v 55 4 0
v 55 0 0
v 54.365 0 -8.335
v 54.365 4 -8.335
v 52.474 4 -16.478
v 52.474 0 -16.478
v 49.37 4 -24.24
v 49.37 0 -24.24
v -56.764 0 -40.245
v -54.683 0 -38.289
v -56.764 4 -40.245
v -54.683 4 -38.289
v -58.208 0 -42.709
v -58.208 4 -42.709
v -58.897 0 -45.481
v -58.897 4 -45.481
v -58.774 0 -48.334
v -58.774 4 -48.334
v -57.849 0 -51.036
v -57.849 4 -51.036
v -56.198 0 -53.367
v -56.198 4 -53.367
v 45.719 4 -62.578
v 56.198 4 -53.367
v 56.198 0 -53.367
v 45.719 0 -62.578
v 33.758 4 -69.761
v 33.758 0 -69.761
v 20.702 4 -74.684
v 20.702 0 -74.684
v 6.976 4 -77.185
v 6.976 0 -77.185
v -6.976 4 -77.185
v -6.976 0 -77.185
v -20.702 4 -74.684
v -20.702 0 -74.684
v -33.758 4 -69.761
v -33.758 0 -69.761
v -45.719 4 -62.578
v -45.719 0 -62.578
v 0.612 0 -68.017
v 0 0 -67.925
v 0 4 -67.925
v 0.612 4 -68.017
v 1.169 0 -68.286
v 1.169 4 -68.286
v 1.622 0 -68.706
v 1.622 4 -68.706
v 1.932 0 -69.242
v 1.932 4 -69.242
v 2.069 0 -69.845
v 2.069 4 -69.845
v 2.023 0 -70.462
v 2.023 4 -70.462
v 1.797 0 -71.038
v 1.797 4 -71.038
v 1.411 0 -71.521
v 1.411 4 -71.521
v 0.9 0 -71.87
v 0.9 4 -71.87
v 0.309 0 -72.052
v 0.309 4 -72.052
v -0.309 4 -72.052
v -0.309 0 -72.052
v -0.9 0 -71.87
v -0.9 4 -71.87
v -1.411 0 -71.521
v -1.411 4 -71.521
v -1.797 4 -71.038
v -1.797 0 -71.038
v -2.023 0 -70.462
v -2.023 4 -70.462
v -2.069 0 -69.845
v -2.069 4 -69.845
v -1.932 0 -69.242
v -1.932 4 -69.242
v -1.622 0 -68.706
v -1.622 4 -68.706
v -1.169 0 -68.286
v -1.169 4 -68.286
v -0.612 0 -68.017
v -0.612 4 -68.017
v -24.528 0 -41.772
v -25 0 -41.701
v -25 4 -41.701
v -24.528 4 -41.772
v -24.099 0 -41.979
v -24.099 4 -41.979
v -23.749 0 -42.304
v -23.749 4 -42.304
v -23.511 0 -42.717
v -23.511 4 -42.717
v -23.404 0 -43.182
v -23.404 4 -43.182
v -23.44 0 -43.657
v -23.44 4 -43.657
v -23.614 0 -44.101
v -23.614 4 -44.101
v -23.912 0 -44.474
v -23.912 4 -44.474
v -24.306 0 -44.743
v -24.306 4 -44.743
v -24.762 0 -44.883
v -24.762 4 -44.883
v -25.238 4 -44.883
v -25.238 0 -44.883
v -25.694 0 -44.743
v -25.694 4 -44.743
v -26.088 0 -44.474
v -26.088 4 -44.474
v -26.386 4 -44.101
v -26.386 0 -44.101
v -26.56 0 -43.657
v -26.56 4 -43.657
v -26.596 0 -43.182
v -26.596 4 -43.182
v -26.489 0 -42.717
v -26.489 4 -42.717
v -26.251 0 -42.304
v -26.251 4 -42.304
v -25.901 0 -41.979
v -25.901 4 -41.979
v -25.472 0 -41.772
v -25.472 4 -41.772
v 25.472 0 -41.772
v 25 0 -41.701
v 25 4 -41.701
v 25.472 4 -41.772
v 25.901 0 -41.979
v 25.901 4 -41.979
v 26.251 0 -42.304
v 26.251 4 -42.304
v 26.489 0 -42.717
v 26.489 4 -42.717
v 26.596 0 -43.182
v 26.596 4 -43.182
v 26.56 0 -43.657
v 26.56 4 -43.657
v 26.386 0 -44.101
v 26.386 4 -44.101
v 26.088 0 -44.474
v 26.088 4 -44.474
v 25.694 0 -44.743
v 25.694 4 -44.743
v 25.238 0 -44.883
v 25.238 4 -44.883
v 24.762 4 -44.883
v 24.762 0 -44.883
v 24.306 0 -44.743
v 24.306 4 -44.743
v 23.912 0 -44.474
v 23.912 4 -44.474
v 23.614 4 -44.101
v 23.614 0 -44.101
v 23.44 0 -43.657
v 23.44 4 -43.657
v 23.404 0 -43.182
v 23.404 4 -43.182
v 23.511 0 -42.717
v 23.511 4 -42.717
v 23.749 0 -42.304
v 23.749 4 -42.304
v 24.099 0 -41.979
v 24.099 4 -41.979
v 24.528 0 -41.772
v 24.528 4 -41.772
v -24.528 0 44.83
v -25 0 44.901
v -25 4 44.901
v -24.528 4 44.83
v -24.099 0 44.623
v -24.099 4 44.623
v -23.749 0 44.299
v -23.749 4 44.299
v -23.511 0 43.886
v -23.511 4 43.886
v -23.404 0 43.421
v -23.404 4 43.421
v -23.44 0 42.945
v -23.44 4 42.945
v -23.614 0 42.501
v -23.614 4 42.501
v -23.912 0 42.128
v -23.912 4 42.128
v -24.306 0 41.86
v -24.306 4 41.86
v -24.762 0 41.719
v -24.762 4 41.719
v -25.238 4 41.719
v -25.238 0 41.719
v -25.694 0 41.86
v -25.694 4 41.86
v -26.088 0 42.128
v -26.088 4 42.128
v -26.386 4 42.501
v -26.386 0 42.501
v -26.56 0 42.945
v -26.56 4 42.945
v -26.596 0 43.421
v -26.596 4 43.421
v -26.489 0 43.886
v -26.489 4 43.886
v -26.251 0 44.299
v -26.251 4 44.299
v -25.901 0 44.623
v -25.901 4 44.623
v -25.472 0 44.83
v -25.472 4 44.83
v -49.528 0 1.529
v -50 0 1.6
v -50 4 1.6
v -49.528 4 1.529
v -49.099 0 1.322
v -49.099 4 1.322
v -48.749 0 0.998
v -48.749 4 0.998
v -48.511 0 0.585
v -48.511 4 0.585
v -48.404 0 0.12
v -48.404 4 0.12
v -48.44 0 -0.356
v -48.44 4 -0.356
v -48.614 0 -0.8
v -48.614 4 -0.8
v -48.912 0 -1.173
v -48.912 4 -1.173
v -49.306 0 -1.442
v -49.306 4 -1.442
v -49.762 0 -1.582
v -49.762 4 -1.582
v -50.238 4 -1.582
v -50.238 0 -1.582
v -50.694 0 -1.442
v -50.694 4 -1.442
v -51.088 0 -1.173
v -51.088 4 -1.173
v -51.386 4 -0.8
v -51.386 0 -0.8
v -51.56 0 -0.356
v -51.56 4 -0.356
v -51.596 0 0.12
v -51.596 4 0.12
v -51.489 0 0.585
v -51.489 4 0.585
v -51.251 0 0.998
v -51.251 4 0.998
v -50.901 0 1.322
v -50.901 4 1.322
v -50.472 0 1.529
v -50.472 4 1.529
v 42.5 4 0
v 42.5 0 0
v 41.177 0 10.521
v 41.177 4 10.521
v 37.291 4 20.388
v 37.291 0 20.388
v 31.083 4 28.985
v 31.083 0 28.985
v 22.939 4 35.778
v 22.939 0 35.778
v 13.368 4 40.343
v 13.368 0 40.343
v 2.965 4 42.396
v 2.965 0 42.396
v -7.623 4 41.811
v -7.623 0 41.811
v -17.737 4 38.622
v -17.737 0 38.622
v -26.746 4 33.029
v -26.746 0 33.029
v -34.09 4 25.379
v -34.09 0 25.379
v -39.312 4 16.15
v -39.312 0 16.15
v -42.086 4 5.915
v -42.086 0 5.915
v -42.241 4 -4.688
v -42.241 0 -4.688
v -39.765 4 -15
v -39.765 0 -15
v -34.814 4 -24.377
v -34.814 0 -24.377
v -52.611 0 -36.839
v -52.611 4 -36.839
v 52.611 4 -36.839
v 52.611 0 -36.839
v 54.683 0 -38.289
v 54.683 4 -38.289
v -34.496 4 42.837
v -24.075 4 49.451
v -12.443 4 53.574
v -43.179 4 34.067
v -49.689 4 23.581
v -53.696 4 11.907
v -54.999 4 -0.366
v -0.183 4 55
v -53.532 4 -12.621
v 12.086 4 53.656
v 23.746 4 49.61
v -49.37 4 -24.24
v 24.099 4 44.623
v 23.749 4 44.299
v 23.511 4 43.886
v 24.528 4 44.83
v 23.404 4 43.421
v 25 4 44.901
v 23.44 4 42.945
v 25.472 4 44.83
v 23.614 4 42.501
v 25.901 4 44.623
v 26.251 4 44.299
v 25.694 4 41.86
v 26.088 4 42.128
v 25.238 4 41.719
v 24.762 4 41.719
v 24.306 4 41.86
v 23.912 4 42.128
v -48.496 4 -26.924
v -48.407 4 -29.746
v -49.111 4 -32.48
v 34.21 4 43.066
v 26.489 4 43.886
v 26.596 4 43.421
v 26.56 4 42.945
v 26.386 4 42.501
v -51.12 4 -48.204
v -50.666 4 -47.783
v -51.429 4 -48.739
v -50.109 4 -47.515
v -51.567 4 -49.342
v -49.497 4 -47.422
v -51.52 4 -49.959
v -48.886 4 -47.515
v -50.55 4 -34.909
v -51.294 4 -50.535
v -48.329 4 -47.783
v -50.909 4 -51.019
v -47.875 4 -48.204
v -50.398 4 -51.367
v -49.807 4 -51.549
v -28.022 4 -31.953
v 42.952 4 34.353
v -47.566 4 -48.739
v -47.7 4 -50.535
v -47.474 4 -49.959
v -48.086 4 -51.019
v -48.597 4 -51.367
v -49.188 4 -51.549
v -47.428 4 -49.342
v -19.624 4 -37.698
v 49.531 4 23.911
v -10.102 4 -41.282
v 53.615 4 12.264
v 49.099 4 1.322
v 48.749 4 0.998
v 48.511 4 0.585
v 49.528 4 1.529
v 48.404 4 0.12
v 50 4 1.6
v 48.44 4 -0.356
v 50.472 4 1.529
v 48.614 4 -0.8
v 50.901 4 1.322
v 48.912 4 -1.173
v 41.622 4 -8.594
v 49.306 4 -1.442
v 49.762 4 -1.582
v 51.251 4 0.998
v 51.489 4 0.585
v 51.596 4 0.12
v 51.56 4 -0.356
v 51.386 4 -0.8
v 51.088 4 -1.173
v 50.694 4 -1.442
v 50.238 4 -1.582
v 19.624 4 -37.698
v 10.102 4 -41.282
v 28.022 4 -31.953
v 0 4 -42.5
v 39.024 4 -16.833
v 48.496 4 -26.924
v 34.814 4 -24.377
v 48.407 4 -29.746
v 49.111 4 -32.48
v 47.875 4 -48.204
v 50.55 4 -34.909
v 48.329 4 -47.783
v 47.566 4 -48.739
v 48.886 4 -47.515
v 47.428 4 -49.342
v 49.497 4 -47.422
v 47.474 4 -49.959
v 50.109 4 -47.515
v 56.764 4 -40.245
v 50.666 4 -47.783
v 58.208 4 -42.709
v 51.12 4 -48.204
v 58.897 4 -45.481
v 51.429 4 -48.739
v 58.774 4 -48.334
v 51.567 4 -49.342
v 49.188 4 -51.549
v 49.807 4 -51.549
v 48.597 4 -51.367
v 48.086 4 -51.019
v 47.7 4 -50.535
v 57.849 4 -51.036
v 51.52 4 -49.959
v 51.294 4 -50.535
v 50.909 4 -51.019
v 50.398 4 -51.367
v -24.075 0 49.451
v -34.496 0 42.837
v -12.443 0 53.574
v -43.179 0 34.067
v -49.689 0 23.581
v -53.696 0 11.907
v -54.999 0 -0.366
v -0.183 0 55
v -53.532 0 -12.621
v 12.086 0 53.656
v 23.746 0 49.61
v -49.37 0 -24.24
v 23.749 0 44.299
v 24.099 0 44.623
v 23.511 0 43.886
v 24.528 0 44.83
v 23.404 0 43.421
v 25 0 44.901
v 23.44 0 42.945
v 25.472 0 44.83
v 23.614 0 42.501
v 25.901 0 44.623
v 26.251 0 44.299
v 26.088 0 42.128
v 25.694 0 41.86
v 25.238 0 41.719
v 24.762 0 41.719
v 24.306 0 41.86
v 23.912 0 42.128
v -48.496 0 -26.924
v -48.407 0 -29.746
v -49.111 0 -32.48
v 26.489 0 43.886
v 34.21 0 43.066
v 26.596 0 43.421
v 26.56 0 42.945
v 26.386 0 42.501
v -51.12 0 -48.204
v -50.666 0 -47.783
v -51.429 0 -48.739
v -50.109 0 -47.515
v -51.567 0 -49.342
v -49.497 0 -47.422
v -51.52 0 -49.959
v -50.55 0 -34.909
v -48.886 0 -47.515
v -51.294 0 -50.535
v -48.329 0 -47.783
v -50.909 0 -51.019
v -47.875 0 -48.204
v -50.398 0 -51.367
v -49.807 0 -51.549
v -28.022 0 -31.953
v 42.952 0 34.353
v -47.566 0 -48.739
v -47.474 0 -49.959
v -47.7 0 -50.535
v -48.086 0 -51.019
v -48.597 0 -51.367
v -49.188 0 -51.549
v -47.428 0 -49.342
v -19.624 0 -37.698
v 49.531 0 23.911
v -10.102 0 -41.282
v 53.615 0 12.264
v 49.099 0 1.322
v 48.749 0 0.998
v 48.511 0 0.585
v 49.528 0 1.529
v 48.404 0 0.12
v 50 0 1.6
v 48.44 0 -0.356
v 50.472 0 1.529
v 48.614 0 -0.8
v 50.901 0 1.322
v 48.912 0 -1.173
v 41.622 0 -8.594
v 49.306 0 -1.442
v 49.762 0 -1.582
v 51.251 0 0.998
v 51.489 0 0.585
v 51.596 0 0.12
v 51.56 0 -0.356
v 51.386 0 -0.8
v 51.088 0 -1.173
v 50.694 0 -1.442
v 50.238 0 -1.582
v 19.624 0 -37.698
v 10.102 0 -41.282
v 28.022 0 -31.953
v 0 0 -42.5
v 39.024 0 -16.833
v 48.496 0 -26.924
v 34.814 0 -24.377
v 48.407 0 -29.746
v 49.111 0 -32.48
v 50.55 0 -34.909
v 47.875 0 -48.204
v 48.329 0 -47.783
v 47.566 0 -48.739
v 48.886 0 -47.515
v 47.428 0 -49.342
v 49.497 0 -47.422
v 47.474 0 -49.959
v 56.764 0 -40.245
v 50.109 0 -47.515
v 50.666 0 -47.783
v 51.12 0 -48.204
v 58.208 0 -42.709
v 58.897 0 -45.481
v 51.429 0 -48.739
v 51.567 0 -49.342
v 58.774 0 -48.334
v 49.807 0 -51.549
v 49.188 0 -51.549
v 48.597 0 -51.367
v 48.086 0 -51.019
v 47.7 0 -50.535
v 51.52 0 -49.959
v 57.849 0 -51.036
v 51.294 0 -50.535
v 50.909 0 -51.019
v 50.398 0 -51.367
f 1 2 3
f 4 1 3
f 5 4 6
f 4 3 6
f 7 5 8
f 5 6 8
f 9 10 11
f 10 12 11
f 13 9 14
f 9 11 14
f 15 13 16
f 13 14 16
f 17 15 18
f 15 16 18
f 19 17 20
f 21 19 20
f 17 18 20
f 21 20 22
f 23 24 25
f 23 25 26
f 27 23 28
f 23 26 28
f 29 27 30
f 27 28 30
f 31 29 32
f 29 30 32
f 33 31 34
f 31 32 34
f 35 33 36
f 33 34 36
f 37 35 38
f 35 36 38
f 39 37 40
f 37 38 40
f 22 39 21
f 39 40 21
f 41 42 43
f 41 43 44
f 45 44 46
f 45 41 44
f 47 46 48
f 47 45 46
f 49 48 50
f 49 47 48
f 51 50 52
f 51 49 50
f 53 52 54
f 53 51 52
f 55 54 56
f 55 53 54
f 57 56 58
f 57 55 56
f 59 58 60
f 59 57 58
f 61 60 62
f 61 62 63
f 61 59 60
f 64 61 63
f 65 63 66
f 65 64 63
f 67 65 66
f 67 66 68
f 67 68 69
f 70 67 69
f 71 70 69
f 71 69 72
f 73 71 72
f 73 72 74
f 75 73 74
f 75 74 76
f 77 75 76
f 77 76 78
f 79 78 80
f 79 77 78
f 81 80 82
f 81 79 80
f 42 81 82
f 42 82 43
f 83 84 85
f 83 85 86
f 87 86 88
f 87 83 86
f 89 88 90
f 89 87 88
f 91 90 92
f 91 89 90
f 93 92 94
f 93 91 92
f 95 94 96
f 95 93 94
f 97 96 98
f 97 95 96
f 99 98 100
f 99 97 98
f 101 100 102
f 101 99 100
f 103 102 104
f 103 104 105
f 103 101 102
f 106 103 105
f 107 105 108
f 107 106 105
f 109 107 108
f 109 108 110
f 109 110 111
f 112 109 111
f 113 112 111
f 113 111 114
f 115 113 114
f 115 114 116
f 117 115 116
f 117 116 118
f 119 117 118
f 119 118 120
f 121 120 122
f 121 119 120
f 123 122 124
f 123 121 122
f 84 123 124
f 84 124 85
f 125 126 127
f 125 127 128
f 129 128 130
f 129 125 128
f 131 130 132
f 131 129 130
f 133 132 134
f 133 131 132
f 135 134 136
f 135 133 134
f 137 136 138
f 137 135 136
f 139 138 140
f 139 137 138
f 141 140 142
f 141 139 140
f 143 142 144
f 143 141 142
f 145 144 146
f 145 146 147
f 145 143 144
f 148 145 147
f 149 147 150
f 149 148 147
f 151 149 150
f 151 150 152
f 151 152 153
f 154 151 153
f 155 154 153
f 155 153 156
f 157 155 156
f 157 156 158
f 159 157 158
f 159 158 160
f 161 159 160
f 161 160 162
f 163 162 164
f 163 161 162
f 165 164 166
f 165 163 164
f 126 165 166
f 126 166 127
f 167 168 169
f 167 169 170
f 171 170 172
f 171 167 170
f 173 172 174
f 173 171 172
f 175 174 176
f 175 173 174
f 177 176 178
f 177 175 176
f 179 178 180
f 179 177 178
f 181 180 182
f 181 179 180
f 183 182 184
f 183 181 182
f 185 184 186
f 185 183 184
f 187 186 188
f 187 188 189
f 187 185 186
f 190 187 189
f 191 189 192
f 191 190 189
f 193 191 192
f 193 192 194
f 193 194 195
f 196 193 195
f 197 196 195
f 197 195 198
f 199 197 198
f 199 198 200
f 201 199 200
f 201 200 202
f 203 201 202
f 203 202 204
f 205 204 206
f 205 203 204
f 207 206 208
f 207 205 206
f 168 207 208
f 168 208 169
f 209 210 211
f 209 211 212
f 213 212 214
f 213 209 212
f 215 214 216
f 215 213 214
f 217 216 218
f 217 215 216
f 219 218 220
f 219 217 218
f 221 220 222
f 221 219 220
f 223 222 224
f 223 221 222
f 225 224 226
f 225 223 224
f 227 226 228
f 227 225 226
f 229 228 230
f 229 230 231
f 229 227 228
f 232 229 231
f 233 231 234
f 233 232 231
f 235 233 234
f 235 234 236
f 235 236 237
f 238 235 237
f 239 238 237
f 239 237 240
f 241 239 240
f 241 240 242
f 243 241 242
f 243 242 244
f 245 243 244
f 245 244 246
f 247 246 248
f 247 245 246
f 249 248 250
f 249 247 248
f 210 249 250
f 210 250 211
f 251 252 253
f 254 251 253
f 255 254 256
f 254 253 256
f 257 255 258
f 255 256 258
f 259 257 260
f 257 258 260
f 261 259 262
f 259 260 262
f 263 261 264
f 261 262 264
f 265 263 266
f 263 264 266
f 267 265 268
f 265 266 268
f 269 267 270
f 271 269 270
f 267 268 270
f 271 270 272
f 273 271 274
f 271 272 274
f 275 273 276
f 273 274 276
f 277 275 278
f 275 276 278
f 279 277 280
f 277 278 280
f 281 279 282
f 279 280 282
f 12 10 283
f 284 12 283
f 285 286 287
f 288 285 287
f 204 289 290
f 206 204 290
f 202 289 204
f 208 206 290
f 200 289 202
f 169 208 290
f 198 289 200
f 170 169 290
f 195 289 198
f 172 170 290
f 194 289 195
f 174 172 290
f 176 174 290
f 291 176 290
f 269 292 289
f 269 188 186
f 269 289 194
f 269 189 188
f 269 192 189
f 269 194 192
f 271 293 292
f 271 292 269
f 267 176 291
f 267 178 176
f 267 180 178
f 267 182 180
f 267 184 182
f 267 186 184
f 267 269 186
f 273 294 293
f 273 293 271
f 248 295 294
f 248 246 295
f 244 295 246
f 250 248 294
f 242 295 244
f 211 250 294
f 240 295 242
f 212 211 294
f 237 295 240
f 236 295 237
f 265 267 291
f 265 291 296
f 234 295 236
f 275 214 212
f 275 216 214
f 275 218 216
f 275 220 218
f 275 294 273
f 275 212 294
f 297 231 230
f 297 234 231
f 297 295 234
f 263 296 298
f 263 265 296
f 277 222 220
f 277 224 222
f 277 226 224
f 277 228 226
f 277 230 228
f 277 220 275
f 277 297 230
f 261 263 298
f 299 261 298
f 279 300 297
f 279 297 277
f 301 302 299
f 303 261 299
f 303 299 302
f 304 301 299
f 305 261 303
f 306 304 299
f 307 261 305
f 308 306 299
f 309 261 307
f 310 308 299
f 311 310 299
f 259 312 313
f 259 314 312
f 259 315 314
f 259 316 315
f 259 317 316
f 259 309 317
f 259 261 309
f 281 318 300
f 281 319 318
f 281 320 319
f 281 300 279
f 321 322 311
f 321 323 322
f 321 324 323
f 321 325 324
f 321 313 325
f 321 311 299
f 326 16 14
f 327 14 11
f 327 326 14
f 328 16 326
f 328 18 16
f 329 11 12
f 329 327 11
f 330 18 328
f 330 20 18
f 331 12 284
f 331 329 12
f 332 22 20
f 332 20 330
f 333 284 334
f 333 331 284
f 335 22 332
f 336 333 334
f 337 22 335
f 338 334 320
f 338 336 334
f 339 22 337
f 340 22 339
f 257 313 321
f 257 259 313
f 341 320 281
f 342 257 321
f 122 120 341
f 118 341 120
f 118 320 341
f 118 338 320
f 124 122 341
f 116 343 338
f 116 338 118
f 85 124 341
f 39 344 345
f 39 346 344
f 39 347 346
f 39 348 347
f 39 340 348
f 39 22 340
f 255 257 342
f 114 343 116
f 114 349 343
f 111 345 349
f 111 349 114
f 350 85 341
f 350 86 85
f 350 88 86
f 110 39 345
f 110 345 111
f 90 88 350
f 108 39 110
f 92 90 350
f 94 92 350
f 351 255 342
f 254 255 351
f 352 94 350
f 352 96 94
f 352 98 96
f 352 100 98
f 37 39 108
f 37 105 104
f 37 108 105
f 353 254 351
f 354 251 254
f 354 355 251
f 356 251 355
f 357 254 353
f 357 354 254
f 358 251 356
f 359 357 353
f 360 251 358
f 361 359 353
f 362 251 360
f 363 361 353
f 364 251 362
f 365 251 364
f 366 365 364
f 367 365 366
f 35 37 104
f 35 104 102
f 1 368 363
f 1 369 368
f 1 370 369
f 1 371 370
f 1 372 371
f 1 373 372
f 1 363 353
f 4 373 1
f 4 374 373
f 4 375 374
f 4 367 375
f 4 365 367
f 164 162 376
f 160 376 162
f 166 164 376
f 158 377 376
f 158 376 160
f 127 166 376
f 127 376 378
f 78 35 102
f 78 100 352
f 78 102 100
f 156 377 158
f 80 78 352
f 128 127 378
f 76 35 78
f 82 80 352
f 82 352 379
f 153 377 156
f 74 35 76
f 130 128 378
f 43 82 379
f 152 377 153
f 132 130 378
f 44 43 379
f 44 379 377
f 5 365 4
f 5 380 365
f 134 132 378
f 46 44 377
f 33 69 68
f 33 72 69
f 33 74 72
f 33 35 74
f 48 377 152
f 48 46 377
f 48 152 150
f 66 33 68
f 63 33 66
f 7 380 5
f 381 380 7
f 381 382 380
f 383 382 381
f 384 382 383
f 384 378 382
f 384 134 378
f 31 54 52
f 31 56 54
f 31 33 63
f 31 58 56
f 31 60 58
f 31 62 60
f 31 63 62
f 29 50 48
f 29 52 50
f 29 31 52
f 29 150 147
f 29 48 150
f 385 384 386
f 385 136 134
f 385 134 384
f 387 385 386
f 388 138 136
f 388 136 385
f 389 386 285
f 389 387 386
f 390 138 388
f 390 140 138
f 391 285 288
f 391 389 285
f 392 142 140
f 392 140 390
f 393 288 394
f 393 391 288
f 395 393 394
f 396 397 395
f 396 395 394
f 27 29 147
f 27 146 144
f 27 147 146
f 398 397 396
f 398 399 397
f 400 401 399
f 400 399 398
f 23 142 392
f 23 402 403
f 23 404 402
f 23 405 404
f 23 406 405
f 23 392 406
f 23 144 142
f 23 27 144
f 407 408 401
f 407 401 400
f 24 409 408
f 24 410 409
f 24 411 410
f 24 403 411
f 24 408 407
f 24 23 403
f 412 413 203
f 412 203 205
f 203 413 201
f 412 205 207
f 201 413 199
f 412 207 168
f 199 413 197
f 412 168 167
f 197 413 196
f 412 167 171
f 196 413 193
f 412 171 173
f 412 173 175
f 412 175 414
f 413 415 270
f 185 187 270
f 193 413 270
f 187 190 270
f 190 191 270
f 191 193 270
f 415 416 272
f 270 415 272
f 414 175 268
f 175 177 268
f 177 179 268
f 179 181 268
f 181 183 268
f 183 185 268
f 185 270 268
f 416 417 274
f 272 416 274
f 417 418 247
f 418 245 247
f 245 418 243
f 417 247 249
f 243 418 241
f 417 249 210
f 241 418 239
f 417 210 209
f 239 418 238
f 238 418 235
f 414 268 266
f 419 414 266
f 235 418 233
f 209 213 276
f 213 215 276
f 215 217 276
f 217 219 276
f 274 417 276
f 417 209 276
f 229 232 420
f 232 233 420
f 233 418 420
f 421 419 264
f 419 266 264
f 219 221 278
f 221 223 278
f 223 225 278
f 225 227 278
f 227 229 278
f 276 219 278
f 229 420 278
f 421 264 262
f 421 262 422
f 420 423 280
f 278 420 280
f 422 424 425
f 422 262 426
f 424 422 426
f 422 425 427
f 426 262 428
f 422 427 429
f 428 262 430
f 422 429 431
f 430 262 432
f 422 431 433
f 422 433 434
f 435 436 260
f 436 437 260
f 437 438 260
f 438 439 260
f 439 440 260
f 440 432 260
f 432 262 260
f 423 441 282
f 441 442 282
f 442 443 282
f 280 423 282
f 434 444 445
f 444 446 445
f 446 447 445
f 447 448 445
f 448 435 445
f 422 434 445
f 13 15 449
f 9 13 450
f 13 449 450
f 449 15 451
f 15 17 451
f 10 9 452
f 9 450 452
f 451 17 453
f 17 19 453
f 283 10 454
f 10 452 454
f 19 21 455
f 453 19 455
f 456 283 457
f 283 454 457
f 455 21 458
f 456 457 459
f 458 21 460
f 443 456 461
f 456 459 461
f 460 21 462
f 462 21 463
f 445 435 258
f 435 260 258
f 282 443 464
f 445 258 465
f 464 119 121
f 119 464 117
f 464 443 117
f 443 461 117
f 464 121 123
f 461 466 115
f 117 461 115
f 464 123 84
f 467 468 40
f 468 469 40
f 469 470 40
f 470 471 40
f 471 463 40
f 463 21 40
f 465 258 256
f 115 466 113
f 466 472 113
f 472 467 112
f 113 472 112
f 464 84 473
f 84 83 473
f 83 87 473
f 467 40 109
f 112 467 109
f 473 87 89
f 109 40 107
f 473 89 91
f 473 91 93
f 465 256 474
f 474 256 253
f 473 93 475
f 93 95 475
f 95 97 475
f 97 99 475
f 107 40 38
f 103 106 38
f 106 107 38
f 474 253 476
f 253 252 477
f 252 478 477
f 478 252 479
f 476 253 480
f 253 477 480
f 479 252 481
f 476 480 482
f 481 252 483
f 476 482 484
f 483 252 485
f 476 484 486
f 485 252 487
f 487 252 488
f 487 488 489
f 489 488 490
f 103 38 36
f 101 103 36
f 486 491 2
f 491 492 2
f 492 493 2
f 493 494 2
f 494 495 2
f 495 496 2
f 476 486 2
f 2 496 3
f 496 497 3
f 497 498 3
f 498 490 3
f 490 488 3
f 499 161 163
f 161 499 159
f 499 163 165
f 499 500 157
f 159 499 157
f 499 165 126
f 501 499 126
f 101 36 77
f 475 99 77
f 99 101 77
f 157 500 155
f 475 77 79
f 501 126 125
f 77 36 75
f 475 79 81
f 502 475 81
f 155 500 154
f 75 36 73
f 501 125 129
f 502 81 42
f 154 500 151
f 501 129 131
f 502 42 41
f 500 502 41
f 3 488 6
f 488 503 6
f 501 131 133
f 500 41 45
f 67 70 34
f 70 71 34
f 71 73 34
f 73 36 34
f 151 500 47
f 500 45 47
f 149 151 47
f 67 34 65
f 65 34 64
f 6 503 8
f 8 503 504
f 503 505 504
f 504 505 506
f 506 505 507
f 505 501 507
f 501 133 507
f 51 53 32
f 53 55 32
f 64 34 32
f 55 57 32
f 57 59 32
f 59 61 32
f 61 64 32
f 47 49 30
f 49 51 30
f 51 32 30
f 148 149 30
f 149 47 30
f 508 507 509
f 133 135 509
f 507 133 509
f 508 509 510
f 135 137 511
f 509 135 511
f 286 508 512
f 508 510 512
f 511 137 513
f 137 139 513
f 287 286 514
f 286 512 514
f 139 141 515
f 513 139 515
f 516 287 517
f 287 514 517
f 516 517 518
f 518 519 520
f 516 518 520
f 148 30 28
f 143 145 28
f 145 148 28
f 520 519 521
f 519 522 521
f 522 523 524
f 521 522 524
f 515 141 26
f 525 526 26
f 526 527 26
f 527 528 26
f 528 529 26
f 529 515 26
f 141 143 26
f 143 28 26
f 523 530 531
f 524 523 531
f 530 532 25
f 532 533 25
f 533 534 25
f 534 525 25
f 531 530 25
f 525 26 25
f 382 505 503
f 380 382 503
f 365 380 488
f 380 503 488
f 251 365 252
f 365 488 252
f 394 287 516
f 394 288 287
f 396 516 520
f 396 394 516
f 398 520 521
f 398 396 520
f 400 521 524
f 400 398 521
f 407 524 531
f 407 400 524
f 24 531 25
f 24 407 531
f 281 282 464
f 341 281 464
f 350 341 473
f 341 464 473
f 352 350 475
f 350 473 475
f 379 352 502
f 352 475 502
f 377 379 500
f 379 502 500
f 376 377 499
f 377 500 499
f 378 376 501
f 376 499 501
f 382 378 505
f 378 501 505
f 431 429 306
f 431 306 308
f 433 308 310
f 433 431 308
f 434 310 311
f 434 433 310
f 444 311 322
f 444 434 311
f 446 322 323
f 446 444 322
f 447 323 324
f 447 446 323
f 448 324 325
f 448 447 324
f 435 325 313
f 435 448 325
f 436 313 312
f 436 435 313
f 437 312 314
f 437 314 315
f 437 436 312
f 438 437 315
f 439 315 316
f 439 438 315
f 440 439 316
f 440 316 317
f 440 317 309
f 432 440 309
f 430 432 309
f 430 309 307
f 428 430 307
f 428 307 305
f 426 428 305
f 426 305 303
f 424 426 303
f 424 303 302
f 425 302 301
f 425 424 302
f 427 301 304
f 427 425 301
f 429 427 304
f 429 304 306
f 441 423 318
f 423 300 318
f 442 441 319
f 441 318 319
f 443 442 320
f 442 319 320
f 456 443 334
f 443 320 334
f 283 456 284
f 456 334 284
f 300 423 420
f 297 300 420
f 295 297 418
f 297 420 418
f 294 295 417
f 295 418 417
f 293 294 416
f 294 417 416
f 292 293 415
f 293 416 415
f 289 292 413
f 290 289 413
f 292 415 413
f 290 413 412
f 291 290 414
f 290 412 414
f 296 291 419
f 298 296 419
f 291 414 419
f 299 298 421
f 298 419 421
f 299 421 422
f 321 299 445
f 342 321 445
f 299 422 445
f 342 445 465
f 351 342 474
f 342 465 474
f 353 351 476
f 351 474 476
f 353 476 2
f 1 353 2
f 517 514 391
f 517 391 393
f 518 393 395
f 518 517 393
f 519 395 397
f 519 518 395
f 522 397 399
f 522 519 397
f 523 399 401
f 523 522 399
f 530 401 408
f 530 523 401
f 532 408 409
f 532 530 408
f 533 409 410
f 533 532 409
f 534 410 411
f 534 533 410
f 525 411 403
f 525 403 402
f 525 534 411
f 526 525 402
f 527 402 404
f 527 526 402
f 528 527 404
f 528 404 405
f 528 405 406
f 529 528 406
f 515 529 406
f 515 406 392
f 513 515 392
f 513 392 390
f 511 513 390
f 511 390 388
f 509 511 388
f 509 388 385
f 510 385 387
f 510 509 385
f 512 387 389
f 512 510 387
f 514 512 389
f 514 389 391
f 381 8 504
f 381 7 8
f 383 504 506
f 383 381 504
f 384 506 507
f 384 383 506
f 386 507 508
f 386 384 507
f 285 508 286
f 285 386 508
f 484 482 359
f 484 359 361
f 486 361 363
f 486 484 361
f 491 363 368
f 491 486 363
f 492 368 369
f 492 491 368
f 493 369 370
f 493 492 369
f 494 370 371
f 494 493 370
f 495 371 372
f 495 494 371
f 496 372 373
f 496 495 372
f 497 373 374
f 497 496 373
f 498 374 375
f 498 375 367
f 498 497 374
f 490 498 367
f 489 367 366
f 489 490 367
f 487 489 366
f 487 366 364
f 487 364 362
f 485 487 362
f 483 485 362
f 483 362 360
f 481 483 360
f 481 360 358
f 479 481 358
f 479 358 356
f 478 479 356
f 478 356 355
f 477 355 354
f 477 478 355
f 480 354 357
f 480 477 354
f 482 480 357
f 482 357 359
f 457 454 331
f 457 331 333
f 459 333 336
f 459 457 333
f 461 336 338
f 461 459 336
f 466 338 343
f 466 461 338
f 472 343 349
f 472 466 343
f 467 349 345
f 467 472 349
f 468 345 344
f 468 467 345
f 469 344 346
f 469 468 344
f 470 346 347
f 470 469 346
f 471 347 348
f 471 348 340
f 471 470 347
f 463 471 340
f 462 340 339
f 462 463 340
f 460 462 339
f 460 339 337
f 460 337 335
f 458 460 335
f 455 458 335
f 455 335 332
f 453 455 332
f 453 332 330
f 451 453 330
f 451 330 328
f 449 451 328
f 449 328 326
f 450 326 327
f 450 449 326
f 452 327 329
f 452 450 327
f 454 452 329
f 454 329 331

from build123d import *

# Parameters (mm, degrees)
SKETCH_1_R      = 2.075
SKETCH_1_R_2    = 1.6
EXTRUDE_1_DEPTH = 4
FILLET_1_R      = 10


with BuildPart() as part:
    # 草图1 → 凸台-拉伸1 (new body)
    # profile 1 of 3: a face of its own
    with BuildSketch(Plane(origin=(0, 0, 0), x_dir=(1, 0, 0), z_dir=(0, 1, 0))):
        with BuildLine():
            Line((-63.484283432, 44.452173817), (-45.053362436, 31.546703999))
            ThreePointArc((-45.053362436, 31.546703999), (0, 55), (45.053362436, 31.546703999))
            Line((45.053362436, 31.546703999), (63.484283432, 44.452173817))
            ThreePointArc((63.484283432, 44.452173817), (0, 77.5), (-63.484283432, 44.452173817))
        make_face()
        with Locations(Location((-49.497474683, 49.497474683, 0), (0, 0, 270))):
            Circle(SKETCH_1_R, mode=Mode.SUBTRACT)
        with Locations(Location((0, 70, 0), (0, 0, 270))):
            Circle(SKETCH_1_R, mode=Mode.SUBTRACT)
        with Locations(Location((49.497474683, 49.497474683, 0), (0, 0, 270))):
            Circle(SKETCH_1_R, mode=Mode.SUBTRACT)
    # profile 2 of 3: a face of its own
    with BuildSketch(Plane(origin=(0, 0, 0), x_dir=(1, 0, 0), z_dir=(0, 1, 0))):
        with BuildLine():
            Line((-45.053362436, 31.546703999), (-34.813961882, 24.376998545))
            ThreePointArc((-34.813961882, 24.376998545), (0, 42.5), (34.813961882, 24.376998545))
            Line((34.813961882, 24.376998545), (45.053362436, 31.546703999))
            ThreePointArc((45.053362436, 31.546703999), (0, 55), (-45.053362436, 31.546703999))
        make_face()
        with Locations(Location((-25, 43.301270189, 0), (0, 0, 270))):
            Circle(SKETCH_1_R_2, mode=Mode.SUBTRACT)
        with Locations(Location((25, 43.301270189, 0), (0, 0, 270))):
            Circle(SKETCH_1_R_2, mode=Mode.SUBTRACT)
    # profile 3 of 3: a face of its own
    with BuildSketch(Plane(origin=(0, 0, 0), x_dir=(1, 0, 0), z_dir=(0, 1, 0))):
        with BuildLine():
            ThreePointArc((42.5, 0), (-12.779996479, -40.532970407), (-34.813961882, 24.376998545))
            Line((-34.813961882, 24.376998545), (-45.053362436, 31.546703999))
            ThreePointArc((-45.053362436, 31.546703999), (-16.538818973, -52.454432291), (55, 0))
            ThreePointArc((55, 0), (52.454432291, 16.538818973), (45.053362436, 31.546703999))
            Line((45.053362436, 31.546703999), (34.813961882, 24.376998545))
            ThreePointArc((34.813961882, 24.376998545), (40.532970407, 12.779996479), (42.5, 0))
        make_face()
        with Locations(Location((-25, -43.301270189, 0), (0, 0, 270))):
            Circle(SKETCH_1_R_2, mode=Mode.SUBTRACT)
        with Locations(Location((-50, 0, 0), (0, 0, 270))):
            Circle(SKETCH_1_R_2, mode=Mode.SUBTRACT)
        with Locations(Location((25, -43.301270189, 0), (0, 0, 270))):
            Circle(SKETCH_1_R_2, mode=Mode.SUBTRACT)
        with Locations(Location((50, 0, 0), (0, 0, 270))):
            Circle(SKETCH_1_R_2, mode=Mode.SUBTRACT)
    extrude(amount=EXTRUDE_1_DEPTH)

    # 圆角1
    fillet_1_edges = [part.edges().sort_by_distance(p)[0] for p in [
        (-45.053362436, 2, -31.546703999),
        (-63.484283432, 2, -44.452173817),
        (63.484283432, 2, -44.452173817),
        (45.053362436, 2, -31.546703999),
    ]]
    fillet(fillet_1_edges, radius=FILLET_1_R)


solid = part.part
